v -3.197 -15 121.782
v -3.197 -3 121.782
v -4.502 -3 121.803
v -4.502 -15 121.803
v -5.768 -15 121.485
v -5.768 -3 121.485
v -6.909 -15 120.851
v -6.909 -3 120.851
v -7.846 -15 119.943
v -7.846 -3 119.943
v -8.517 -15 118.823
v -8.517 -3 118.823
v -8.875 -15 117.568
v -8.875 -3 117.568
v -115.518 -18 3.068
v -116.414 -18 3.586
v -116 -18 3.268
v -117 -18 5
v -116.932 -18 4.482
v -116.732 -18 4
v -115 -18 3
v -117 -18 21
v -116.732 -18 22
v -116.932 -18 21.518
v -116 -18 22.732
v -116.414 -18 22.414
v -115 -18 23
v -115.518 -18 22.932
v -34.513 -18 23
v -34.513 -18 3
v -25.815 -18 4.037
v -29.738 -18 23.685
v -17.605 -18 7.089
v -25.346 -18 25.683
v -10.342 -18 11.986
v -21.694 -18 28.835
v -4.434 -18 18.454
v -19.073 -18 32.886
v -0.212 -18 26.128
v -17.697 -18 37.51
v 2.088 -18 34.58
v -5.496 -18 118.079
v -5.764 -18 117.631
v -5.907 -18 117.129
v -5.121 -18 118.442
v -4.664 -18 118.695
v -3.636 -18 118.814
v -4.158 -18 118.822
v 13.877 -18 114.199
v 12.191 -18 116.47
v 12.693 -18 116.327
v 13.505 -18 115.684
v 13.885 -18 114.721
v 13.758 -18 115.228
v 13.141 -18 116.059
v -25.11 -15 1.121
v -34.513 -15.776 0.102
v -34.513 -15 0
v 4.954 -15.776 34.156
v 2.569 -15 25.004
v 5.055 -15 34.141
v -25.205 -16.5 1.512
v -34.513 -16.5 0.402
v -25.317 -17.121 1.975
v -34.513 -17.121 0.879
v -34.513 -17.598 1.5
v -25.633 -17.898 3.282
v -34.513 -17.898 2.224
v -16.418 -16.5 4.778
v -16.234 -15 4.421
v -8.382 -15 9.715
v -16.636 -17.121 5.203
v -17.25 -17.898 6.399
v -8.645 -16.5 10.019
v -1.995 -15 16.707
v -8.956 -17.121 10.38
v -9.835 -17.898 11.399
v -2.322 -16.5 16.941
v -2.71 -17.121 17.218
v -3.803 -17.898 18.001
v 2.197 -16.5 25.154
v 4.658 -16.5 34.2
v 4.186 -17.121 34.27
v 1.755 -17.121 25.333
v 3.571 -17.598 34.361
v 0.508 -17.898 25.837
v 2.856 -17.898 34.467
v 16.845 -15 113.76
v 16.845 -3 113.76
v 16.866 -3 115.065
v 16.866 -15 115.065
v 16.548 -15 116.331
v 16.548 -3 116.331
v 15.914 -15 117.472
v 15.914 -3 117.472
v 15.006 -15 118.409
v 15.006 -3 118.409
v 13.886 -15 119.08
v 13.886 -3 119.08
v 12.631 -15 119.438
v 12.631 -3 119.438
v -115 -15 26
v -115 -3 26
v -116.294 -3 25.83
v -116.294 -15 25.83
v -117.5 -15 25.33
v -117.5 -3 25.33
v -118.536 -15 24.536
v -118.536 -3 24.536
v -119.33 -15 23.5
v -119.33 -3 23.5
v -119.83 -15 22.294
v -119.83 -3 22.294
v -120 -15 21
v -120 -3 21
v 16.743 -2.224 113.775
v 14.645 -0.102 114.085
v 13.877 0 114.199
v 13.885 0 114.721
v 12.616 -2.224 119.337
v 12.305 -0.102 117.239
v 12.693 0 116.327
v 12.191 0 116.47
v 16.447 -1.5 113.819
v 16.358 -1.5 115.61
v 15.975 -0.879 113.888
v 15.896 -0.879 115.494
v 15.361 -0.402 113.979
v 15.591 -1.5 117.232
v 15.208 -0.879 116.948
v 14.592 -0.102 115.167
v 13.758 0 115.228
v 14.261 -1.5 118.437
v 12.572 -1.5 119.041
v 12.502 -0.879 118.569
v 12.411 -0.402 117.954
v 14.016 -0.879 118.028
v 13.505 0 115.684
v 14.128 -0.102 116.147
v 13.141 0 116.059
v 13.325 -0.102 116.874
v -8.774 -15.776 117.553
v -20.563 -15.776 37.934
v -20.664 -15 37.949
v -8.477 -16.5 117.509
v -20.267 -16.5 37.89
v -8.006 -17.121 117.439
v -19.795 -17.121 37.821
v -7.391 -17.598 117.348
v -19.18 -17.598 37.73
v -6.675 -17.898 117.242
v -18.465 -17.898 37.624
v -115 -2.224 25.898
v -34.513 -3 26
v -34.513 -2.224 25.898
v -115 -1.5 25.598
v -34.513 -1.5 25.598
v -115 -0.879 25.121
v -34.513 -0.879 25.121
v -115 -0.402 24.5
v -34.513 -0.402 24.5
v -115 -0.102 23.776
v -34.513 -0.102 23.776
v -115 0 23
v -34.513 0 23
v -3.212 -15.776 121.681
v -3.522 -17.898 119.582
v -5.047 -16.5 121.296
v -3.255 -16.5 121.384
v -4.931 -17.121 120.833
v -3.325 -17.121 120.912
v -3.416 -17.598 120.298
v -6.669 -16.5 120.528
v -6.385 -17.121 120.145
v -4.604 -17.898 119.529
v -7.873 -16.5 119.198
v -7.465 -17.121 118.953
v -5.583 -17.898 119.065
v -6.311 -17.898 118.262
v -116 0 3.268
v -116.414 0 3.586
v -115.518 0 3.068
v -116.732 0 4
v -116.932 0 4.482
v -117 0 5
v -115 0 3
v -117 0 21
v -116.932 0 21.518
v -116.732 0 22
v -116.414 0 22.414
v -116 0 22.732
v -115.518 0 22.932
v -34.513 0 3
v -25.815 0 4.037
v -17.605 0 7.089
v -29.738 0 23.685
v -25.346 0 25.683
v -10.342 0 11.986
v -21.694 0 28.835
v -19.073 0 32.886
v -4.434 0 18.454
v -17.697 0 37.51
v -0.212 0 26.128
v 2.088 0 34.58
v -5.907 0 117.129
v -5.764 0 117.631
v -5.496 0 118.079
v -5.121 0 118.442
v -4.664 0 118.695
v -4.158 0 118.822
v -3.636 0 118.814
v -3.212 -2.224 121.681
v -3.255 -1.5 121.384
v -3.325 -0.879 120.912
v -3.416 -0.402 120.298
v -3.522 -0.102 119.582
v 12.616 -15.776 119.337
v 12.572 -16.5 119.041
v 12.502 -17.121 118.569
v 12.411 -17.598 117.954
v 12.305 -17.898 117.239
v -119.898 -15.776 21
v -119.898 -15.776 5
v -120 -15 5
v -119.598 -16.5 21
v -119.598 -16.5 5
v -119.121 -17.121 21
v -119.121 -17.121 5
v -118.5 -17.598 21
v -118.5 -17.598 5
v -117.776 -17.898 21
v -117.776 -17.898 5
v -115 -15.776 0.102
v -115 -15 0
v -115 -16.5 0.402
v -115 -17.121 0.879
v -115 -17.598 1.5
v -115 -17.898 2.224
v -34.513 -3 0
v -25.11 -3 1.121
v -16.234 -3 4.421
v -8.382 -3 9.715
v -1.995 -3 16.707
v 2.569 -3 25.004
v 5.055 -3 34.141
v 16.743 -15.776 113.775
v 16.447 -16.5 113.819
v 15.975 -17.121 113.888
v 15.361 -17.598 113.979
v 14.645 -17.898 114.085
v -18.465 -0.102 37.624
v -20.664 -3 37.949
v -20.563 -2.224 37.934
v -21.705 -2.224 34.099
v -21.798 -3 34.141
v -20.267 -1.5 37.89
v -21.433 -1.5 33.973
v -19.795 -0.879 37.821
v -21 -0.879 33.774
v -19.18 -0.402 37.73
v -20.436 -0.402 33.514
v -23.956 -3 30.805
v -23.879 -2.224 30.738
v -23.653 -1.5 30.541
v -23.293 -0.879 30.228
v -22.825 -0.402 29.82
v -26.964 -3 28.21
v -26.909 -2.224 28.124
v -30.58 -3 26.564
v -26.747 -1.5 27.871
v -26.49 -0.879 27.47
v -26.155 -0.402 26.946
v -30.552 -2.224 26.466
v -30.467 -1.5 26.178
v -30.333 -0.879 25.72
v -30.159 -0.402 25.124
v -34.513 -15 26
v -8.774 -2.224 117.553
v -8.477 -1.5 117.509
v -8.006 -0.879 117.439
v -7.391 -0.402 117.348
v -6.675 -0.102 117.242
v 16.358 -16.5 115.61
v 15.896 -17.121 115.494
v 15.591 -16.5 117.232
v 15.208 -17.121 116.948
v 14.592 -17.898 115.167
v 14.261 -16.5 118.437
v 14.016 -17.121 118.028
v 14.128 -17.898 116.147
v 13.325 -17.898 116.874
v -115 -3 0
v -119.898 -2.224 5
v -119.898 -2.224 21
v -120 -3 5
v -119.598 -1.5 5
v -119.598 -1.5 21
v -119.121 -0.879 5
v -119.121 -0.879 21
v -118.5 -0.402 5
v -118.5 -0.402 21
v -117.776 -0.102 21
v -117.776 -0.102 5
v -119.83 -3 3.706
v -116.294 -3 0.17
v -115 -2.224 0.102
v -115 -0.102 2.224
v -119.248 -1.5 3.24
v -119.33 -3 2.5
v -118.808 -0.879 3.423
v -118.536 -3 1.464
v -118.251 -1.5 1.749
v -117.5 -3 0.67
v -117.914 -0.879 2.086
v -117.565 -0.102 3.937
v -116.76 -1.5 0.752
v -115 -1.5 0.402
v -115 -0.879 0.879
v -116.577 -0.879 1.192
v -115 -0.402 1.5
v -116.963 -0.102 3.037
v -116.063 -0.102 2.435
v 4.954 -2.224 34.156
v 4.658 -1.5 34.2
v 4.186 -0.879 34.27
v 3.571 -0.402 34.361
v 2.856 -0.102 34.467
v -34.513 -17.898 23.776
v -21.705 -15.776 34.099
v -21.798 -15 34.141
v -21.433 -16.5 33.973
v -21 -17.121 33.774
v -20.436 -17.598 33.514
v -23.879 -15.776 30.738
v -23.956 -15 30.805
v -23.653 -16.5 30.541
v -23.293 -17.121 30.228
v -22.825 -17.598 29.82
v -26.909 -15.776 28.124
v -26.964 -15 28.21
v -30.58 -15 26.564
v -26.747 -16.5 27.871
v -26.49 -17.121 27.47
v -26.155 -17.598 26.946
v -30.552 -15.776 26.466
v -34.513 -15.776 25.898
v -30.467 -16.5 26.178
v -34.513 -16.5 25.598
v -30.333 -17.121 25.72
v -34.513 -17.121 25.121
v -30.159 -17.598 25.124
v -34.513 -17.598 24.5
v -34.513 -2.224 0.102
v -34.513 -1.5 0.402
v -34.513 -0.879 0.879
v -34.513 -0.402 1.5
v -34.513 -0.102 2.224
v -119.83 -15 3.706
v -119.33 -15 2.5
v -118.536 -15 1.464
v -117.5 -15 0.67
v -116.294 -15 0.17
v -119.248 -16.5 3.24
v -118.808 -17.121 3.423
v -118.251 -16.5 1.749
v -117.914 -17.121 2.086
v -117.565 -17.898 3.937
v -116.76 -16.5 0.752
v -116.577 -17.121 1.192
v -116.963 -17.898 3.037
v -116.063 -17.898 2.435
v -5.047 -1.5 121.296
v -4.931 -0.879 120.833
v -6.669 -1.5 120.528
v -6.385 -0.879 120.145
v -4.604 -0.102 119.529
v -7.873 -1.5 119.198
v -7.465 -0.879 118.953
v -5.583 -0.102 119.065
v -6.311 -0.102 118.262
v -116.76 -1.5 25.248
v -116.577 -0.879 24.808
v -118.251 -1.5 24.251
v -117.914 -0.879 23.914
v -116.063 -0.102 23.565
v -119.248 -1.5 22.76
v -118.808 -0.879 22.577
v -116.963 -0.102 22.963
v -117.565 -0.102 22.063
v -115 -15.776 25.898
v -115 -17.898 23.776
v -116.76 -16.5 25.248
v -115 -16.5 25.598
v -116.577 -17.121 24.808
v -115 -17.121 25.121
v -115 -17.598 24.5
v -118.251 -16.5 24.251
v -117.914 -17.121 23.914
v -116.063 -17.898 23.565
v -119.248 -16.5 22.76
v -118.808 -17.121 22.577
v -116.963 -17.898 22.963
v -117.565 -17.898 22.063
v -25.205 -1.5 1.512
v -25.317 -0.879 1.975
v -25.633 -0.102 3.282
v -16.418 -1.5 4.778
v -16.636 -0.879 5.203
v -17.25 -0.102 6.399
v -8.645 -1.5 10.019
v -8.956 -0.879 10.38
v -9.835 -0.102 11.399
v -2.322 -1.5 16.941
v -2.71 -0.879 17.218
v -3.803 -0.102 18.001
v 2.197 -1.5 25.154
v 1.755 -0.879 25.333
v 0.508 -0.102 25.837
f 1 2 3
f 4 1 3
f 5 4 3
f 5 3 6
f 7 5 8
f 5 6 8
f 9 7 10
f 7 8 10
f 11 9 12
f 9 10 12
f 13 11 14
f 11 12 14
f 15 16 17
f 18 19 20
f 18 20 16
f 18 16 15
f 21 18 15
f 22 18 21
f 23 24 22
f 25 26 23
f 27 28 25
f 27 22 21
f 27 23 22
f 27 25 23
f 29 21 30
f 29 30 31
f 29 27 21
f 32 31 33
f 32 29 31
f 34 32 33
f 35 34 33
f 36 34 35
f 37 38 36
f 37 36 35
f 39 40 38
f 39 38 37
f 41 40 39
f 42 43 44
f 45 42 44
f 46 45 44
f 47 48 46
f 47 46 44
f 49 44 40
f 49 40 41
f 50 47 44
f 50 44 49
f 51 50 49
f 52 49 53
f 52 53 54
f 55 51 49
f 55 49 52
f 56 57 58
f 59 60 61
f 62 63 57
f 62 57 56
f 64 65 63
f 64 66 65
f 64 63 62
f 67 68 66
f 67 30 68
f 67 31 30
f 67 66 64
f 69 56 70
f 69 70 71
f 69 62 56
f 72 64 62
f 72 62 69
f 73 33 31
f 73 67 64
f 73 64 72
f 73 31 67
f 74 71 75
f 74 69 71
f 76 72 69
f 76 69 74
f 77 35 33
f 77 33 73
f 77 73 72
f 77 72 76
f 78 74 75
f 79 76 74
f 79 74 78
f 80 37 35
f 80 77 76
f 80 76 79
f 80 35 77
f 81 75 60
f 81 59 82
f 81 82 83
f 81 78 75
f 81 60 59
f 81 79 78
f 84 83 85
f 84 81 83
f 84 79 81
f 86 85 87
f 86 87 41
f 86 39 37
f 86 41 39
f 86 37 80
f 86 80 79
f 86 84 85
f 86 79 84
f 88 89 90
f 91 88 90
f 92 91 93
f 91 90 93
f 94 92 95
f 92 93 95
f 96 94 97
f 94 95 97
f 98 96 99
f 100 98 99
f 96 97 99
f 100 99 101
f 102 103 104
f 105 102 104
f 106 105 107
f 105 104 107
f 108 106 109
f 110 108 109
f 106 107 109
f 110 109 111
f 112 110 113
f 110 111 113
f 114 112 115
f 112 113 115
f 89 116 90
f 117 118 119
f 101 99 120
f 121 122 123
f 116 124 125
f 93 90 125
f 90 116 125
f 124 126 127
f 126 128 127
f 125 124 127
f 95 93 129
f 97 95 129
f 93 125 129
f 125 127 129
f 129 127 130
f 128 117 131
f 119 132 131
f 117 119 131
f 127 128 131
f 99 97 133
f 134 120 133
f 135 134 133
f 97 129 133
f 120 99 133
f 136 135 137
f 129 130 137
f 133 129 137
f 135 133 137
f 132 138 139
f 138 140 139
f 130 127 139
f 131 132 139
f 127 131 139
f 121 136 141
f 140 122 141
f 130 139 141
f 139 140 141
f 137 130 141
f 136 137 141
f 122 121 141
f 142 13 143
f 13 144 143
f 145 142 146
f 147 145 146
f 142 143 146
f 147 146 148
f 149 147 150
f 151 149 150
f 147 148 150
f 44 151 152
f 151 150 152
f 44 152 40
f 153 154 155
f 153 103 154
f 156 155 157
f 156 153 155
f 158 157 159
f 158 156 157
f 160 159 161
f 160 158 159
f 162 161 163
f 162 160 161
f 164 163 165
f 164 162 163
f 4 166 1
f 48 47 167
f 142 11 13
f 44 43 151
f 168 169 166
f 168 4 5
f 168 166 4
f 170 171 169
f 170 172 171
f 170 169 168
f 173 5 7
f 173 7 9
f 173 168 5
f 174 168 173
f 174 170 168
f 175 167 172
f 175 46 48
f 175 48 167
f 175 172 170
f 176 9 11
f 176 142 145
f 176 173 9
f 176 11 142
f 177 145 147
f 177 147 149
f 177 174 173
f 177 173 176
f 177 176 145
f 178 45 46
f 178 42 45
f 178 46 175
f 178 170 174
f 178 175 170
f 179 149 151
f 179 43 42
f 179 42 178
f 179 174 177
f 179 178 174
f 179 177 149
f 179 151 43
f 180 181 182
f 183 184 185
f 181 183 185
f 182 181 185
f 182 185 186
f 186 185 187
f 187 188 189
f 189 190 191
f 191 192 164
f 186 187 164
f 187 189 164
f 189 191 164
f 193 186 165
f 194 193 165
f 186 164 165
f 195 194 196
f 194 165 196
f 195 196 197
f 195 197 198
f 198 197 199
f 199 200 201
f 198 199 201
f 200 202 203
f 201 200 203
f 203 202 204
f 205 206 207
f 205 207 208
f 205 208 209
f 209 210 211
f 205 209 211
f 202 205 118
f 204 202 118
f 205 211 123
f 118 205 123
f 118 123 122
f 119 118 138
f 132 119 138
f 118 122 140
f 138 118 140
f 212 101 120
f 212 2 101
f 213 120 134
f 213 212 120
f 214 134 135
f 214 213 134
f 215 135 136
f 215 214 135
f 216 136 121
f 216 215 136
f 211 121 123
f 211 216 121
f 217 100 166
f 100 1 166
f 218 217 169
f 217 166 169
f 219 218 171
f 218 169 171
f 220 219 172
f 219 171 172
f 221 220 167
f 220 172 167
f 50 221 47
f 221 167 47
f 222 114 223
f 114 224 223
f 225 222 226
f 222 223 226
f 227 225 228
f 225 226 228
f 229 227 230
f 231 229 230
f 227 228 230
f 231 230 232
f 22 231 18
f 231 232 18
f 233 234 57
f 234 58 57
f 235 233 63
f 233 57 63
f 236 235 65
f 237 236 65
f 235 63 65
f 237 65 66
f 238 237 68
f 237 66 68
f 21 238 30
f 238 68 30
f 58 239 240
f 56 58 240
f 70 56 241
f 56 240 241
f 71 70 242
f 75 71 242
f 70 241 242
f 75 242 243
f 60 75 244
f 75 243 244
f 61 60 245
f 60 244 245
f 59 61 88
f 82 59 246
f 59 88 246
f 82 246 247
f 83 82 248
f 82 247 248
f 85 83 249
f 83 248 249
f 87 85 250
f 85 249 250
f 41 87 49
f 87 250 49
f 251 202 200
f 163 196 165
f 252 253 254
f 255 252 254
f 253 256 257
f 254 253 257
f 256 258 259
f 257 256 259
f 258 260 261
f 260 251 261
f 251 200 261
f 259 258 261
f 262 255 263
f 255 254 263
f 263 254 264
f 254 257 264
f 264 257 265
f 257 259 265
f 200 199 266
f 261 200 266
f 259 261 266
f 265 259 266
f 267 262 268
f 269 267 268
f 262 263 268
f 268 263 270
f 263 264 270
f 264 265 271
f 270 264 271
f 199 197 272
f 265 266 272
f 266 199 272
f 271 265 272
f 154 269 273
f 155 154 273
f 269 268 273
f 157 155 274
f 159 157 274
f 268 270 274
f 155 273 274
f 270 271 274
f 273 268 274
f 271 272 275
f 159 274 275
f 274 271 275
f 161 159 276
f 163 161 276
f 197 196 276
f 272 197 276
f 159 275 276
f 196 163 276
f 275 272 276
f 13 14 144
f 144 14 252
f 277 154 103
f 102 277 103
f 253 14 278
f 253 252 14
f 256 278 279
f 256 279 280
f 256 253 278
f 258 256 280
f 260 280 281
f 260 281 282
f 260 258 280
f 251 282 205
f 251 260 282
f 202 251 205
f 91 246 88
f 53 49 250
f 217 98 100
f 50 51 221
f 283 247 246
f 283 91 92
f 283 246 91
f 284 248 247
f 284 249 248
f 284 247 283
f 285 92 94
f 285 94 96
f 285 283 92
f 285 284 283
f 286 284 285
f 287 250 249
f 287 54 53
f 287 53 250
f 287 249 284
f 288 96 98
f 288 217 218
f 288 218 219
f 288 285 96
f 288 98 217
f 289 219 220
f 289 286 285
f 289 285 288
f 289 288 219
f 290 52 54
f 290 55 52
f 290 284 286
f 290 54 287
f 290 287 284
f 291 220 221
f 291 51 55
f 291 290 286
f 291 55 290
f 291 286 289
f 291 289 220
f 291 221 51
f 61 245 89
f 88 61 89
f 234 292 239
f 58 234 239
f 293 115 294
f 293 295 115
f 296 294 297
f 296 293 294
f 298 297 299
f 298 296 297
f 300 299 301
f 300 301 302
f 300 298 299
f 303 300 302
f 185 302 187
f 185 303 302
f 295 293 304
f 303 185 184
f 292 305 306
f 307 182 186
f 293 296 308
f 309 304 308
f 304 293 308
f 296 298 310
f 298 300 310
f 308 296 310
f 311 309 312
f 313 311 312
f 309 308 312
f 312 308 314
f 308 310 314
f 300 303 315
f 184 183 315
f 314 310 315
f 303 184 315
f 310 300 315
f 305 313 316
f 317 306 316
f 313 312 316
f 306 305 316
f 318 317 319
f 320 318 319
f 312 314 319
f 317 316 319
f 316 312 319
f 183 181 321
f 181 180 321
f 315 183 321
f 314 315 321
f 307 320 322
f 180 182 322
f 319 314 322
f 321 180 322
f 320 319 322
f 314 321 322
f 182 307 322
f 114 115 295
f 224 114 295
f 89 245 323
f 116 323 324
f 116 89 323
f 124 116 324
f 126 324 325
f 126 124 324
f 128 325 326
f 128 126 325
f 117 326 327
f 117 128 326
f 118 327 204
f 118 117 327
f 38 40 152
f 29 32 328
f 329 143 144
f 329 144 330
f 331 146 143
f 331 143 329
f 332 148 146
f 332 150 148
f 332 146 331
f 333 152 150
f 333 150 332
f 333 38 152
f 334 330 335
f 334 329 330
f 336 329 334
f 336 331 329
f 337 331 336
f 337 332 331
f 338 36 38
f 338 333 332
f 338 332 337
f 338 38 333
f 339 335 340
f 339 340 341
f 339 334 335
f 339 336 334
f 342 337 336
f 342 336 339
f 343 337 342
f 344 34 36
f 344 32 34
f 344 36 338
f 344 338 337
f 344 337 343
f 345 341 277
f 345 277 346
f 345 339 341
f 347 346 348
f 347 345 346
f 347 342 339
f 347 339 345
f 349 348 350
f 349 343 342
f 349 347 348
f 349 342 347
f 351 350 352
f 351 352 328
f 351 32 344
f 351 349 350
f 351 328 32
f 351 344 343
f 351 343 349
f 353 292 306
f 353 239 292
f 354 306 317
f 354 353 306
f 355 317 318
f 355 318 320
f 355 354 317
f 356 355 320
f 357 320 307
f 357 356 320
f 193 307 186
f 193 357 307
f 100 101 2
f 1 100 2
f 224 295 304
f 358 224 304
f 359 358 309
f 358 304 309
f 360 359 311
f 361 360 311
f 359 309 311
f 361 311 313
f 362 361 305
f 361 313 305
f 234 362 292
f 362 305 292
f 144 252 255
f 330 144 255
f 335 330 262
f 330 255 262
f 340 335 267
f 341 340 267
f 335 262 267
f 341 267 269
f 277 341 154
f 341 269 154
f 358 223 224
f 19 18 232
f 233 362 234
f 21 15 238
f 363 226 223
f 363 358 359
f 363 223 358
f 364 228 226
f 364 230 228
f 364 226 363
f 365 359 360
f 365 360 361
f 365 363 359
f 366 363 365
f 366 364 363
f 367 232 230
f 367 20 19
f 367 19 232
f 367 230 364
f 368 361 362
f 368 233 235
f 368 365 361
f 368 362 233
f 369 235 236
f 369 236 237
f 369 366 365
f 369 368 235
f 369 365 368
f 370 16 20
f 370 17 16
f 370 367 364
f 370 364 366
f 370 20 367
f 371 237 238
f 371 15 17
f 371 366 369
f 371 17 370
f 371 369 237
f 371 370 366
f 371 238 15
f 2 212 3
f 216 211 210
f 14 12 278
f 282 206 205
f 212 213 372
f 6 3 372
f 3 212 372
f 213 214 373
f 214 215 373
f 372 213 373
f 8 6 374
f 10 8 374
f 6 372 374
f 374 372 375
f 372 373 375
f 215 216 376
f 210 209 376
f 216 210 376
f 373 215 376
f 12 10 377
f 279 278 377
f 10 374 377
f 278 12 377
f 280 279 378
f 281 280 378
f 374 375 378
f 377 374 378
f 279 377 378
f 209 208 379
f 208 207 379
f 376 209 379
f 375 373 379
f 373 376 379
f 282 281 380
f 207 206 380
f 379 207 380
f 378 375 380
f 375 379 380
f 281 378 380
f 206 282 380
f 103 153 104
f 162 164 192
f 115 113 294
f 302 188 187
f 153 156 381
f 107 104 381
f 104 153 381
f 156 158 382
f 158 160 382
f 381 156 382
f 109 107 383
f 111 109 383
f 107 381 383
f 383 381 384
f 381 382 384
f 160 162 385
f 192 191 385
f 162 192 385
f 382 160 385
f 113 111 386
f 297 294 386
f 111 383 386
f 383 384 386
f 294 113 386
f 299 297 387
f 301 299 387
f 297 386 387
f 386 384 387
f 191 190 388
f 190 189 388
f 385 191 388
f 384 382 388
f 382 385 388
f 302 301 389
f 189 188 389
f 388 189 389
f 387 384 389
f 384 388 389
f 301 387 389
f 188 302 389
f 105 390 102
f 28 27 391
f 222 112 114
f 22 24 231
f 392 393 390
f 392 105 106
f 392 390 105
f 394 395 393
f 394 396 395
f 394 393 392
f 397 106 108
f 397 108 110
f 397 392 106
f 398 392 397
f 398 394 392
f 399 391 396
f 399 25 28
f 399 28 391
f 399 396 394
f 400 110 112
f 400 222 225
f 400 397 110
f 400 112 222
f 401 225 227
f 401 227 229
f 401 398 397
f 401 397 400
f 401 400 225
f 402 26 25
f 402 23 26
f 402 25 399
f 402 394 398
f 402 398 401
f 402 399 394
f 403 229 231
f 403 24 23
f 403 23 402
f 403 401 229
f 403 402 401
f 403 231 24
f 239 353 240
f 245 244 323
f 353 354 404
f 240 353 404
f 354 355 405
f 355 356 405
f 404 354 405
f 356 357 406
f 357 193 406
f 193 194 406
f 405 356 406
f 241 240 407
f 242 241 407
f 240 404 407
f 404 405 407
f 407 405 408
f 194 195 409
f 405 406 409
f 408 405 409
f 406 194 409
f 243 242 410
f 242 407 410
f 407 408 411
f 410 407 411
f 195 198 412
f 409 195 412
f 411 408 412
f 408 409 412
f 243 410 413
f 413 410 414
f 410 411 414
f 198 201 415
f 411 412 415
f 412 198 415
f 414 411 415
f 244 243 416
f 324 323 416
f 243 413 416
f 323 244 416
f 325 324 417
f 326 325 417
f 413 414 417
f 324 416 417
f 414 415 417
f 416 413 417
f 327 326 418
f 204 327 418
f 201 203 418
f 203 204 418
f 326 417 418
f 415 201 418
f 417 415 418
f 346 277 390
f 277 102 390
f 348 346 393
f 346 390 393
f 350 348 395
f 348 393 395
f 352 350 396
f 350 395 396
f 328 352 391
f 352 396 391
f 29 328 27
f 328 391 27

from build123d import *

# Parameters (mm, degrees)
F1_DEPTH = 18
F2_R     = 3


with BuildPart() as f1:
    # F0 (on Front) → F1 (new body)
    with BuildSketch(Plane.XZ):
        with BuildLine():
            ThreePointArc((-120, 5), (-118.535534, 1.464466), (-115, 0))
            Line((-115, 0), (-34.513279, 0))
            ThreePointArc((-34.513279, 0), (-8.382441, 9.715032), (5.055301, 34.141037))
            Line((5.055301, 34.141037), (16.844519, 113.759668))
            ThreePointArc((16.844519, 113.759668), (15.913712, 117.471576), (12.630817, 119.438111))
            Line((12.630817, 119.438111), (-3.196615, 121.781697))
            ThreePointArc((-3.196615, 121.781697), (-6.908523, 120.85089), (-8.875058, 117.567995))
            Line((-8.875058, 117.567995), (-20.664276, 37.949363))
            ThreePointArc((-20.664276, 37.949363), (-25.367486, 29.400261), (-34.513279, 26))
            Line((-34.513279, 26), (-115, 26))
            ThreePointArc((-115, 26), (-118.535534, 24.535534), (-120, 21))
            Line((-120, 21), (-120, 5))
        make_face()
    extrude(amount=F1_DEPTH)

    # F2
    f2_edges = [f1.edges().sort_by_distance(p)[0] for p in [
        (-14.769667, -18, 77.758679),
        (-25.367486, -18, 29.400261),
        (-74.75664, -18, 26),
        (-118.535534, -18, 24.535534),
        (-120, -18, 13),
        (-118.535534, -18, 1.464466),
        (-74.75664, -18, 0),
        (-8.382441, -18, 9.715032),
        (10.94991, -18, 73.950353),
        (15.913712, -18, 117.471576),
        (4.717101, -18, 120.609904),
        (-6.908523, -18, 120.85089),
        (-14.769667, 0, 77.758679),
        (-25.367486, 0, 29.400261),
        (-74.75664, 0, 26),
        (-118.535534, 0, 24.535534),
        (-120, 0, 13),
        (-118.535534, 0, 1.464466),
        (-74.75664, 0, 0),
        (-8.382441, 0, 9.715032),
        (10.94991, 0, 73.950353),
        (15.913712, 0, 117.471576),
        (4.717101, 0, 120.609904),
        (-6.908523, 0, 120.85089),
    ]]
    fillet(f2_edges, radius=F2_R)


solid = f1.part
